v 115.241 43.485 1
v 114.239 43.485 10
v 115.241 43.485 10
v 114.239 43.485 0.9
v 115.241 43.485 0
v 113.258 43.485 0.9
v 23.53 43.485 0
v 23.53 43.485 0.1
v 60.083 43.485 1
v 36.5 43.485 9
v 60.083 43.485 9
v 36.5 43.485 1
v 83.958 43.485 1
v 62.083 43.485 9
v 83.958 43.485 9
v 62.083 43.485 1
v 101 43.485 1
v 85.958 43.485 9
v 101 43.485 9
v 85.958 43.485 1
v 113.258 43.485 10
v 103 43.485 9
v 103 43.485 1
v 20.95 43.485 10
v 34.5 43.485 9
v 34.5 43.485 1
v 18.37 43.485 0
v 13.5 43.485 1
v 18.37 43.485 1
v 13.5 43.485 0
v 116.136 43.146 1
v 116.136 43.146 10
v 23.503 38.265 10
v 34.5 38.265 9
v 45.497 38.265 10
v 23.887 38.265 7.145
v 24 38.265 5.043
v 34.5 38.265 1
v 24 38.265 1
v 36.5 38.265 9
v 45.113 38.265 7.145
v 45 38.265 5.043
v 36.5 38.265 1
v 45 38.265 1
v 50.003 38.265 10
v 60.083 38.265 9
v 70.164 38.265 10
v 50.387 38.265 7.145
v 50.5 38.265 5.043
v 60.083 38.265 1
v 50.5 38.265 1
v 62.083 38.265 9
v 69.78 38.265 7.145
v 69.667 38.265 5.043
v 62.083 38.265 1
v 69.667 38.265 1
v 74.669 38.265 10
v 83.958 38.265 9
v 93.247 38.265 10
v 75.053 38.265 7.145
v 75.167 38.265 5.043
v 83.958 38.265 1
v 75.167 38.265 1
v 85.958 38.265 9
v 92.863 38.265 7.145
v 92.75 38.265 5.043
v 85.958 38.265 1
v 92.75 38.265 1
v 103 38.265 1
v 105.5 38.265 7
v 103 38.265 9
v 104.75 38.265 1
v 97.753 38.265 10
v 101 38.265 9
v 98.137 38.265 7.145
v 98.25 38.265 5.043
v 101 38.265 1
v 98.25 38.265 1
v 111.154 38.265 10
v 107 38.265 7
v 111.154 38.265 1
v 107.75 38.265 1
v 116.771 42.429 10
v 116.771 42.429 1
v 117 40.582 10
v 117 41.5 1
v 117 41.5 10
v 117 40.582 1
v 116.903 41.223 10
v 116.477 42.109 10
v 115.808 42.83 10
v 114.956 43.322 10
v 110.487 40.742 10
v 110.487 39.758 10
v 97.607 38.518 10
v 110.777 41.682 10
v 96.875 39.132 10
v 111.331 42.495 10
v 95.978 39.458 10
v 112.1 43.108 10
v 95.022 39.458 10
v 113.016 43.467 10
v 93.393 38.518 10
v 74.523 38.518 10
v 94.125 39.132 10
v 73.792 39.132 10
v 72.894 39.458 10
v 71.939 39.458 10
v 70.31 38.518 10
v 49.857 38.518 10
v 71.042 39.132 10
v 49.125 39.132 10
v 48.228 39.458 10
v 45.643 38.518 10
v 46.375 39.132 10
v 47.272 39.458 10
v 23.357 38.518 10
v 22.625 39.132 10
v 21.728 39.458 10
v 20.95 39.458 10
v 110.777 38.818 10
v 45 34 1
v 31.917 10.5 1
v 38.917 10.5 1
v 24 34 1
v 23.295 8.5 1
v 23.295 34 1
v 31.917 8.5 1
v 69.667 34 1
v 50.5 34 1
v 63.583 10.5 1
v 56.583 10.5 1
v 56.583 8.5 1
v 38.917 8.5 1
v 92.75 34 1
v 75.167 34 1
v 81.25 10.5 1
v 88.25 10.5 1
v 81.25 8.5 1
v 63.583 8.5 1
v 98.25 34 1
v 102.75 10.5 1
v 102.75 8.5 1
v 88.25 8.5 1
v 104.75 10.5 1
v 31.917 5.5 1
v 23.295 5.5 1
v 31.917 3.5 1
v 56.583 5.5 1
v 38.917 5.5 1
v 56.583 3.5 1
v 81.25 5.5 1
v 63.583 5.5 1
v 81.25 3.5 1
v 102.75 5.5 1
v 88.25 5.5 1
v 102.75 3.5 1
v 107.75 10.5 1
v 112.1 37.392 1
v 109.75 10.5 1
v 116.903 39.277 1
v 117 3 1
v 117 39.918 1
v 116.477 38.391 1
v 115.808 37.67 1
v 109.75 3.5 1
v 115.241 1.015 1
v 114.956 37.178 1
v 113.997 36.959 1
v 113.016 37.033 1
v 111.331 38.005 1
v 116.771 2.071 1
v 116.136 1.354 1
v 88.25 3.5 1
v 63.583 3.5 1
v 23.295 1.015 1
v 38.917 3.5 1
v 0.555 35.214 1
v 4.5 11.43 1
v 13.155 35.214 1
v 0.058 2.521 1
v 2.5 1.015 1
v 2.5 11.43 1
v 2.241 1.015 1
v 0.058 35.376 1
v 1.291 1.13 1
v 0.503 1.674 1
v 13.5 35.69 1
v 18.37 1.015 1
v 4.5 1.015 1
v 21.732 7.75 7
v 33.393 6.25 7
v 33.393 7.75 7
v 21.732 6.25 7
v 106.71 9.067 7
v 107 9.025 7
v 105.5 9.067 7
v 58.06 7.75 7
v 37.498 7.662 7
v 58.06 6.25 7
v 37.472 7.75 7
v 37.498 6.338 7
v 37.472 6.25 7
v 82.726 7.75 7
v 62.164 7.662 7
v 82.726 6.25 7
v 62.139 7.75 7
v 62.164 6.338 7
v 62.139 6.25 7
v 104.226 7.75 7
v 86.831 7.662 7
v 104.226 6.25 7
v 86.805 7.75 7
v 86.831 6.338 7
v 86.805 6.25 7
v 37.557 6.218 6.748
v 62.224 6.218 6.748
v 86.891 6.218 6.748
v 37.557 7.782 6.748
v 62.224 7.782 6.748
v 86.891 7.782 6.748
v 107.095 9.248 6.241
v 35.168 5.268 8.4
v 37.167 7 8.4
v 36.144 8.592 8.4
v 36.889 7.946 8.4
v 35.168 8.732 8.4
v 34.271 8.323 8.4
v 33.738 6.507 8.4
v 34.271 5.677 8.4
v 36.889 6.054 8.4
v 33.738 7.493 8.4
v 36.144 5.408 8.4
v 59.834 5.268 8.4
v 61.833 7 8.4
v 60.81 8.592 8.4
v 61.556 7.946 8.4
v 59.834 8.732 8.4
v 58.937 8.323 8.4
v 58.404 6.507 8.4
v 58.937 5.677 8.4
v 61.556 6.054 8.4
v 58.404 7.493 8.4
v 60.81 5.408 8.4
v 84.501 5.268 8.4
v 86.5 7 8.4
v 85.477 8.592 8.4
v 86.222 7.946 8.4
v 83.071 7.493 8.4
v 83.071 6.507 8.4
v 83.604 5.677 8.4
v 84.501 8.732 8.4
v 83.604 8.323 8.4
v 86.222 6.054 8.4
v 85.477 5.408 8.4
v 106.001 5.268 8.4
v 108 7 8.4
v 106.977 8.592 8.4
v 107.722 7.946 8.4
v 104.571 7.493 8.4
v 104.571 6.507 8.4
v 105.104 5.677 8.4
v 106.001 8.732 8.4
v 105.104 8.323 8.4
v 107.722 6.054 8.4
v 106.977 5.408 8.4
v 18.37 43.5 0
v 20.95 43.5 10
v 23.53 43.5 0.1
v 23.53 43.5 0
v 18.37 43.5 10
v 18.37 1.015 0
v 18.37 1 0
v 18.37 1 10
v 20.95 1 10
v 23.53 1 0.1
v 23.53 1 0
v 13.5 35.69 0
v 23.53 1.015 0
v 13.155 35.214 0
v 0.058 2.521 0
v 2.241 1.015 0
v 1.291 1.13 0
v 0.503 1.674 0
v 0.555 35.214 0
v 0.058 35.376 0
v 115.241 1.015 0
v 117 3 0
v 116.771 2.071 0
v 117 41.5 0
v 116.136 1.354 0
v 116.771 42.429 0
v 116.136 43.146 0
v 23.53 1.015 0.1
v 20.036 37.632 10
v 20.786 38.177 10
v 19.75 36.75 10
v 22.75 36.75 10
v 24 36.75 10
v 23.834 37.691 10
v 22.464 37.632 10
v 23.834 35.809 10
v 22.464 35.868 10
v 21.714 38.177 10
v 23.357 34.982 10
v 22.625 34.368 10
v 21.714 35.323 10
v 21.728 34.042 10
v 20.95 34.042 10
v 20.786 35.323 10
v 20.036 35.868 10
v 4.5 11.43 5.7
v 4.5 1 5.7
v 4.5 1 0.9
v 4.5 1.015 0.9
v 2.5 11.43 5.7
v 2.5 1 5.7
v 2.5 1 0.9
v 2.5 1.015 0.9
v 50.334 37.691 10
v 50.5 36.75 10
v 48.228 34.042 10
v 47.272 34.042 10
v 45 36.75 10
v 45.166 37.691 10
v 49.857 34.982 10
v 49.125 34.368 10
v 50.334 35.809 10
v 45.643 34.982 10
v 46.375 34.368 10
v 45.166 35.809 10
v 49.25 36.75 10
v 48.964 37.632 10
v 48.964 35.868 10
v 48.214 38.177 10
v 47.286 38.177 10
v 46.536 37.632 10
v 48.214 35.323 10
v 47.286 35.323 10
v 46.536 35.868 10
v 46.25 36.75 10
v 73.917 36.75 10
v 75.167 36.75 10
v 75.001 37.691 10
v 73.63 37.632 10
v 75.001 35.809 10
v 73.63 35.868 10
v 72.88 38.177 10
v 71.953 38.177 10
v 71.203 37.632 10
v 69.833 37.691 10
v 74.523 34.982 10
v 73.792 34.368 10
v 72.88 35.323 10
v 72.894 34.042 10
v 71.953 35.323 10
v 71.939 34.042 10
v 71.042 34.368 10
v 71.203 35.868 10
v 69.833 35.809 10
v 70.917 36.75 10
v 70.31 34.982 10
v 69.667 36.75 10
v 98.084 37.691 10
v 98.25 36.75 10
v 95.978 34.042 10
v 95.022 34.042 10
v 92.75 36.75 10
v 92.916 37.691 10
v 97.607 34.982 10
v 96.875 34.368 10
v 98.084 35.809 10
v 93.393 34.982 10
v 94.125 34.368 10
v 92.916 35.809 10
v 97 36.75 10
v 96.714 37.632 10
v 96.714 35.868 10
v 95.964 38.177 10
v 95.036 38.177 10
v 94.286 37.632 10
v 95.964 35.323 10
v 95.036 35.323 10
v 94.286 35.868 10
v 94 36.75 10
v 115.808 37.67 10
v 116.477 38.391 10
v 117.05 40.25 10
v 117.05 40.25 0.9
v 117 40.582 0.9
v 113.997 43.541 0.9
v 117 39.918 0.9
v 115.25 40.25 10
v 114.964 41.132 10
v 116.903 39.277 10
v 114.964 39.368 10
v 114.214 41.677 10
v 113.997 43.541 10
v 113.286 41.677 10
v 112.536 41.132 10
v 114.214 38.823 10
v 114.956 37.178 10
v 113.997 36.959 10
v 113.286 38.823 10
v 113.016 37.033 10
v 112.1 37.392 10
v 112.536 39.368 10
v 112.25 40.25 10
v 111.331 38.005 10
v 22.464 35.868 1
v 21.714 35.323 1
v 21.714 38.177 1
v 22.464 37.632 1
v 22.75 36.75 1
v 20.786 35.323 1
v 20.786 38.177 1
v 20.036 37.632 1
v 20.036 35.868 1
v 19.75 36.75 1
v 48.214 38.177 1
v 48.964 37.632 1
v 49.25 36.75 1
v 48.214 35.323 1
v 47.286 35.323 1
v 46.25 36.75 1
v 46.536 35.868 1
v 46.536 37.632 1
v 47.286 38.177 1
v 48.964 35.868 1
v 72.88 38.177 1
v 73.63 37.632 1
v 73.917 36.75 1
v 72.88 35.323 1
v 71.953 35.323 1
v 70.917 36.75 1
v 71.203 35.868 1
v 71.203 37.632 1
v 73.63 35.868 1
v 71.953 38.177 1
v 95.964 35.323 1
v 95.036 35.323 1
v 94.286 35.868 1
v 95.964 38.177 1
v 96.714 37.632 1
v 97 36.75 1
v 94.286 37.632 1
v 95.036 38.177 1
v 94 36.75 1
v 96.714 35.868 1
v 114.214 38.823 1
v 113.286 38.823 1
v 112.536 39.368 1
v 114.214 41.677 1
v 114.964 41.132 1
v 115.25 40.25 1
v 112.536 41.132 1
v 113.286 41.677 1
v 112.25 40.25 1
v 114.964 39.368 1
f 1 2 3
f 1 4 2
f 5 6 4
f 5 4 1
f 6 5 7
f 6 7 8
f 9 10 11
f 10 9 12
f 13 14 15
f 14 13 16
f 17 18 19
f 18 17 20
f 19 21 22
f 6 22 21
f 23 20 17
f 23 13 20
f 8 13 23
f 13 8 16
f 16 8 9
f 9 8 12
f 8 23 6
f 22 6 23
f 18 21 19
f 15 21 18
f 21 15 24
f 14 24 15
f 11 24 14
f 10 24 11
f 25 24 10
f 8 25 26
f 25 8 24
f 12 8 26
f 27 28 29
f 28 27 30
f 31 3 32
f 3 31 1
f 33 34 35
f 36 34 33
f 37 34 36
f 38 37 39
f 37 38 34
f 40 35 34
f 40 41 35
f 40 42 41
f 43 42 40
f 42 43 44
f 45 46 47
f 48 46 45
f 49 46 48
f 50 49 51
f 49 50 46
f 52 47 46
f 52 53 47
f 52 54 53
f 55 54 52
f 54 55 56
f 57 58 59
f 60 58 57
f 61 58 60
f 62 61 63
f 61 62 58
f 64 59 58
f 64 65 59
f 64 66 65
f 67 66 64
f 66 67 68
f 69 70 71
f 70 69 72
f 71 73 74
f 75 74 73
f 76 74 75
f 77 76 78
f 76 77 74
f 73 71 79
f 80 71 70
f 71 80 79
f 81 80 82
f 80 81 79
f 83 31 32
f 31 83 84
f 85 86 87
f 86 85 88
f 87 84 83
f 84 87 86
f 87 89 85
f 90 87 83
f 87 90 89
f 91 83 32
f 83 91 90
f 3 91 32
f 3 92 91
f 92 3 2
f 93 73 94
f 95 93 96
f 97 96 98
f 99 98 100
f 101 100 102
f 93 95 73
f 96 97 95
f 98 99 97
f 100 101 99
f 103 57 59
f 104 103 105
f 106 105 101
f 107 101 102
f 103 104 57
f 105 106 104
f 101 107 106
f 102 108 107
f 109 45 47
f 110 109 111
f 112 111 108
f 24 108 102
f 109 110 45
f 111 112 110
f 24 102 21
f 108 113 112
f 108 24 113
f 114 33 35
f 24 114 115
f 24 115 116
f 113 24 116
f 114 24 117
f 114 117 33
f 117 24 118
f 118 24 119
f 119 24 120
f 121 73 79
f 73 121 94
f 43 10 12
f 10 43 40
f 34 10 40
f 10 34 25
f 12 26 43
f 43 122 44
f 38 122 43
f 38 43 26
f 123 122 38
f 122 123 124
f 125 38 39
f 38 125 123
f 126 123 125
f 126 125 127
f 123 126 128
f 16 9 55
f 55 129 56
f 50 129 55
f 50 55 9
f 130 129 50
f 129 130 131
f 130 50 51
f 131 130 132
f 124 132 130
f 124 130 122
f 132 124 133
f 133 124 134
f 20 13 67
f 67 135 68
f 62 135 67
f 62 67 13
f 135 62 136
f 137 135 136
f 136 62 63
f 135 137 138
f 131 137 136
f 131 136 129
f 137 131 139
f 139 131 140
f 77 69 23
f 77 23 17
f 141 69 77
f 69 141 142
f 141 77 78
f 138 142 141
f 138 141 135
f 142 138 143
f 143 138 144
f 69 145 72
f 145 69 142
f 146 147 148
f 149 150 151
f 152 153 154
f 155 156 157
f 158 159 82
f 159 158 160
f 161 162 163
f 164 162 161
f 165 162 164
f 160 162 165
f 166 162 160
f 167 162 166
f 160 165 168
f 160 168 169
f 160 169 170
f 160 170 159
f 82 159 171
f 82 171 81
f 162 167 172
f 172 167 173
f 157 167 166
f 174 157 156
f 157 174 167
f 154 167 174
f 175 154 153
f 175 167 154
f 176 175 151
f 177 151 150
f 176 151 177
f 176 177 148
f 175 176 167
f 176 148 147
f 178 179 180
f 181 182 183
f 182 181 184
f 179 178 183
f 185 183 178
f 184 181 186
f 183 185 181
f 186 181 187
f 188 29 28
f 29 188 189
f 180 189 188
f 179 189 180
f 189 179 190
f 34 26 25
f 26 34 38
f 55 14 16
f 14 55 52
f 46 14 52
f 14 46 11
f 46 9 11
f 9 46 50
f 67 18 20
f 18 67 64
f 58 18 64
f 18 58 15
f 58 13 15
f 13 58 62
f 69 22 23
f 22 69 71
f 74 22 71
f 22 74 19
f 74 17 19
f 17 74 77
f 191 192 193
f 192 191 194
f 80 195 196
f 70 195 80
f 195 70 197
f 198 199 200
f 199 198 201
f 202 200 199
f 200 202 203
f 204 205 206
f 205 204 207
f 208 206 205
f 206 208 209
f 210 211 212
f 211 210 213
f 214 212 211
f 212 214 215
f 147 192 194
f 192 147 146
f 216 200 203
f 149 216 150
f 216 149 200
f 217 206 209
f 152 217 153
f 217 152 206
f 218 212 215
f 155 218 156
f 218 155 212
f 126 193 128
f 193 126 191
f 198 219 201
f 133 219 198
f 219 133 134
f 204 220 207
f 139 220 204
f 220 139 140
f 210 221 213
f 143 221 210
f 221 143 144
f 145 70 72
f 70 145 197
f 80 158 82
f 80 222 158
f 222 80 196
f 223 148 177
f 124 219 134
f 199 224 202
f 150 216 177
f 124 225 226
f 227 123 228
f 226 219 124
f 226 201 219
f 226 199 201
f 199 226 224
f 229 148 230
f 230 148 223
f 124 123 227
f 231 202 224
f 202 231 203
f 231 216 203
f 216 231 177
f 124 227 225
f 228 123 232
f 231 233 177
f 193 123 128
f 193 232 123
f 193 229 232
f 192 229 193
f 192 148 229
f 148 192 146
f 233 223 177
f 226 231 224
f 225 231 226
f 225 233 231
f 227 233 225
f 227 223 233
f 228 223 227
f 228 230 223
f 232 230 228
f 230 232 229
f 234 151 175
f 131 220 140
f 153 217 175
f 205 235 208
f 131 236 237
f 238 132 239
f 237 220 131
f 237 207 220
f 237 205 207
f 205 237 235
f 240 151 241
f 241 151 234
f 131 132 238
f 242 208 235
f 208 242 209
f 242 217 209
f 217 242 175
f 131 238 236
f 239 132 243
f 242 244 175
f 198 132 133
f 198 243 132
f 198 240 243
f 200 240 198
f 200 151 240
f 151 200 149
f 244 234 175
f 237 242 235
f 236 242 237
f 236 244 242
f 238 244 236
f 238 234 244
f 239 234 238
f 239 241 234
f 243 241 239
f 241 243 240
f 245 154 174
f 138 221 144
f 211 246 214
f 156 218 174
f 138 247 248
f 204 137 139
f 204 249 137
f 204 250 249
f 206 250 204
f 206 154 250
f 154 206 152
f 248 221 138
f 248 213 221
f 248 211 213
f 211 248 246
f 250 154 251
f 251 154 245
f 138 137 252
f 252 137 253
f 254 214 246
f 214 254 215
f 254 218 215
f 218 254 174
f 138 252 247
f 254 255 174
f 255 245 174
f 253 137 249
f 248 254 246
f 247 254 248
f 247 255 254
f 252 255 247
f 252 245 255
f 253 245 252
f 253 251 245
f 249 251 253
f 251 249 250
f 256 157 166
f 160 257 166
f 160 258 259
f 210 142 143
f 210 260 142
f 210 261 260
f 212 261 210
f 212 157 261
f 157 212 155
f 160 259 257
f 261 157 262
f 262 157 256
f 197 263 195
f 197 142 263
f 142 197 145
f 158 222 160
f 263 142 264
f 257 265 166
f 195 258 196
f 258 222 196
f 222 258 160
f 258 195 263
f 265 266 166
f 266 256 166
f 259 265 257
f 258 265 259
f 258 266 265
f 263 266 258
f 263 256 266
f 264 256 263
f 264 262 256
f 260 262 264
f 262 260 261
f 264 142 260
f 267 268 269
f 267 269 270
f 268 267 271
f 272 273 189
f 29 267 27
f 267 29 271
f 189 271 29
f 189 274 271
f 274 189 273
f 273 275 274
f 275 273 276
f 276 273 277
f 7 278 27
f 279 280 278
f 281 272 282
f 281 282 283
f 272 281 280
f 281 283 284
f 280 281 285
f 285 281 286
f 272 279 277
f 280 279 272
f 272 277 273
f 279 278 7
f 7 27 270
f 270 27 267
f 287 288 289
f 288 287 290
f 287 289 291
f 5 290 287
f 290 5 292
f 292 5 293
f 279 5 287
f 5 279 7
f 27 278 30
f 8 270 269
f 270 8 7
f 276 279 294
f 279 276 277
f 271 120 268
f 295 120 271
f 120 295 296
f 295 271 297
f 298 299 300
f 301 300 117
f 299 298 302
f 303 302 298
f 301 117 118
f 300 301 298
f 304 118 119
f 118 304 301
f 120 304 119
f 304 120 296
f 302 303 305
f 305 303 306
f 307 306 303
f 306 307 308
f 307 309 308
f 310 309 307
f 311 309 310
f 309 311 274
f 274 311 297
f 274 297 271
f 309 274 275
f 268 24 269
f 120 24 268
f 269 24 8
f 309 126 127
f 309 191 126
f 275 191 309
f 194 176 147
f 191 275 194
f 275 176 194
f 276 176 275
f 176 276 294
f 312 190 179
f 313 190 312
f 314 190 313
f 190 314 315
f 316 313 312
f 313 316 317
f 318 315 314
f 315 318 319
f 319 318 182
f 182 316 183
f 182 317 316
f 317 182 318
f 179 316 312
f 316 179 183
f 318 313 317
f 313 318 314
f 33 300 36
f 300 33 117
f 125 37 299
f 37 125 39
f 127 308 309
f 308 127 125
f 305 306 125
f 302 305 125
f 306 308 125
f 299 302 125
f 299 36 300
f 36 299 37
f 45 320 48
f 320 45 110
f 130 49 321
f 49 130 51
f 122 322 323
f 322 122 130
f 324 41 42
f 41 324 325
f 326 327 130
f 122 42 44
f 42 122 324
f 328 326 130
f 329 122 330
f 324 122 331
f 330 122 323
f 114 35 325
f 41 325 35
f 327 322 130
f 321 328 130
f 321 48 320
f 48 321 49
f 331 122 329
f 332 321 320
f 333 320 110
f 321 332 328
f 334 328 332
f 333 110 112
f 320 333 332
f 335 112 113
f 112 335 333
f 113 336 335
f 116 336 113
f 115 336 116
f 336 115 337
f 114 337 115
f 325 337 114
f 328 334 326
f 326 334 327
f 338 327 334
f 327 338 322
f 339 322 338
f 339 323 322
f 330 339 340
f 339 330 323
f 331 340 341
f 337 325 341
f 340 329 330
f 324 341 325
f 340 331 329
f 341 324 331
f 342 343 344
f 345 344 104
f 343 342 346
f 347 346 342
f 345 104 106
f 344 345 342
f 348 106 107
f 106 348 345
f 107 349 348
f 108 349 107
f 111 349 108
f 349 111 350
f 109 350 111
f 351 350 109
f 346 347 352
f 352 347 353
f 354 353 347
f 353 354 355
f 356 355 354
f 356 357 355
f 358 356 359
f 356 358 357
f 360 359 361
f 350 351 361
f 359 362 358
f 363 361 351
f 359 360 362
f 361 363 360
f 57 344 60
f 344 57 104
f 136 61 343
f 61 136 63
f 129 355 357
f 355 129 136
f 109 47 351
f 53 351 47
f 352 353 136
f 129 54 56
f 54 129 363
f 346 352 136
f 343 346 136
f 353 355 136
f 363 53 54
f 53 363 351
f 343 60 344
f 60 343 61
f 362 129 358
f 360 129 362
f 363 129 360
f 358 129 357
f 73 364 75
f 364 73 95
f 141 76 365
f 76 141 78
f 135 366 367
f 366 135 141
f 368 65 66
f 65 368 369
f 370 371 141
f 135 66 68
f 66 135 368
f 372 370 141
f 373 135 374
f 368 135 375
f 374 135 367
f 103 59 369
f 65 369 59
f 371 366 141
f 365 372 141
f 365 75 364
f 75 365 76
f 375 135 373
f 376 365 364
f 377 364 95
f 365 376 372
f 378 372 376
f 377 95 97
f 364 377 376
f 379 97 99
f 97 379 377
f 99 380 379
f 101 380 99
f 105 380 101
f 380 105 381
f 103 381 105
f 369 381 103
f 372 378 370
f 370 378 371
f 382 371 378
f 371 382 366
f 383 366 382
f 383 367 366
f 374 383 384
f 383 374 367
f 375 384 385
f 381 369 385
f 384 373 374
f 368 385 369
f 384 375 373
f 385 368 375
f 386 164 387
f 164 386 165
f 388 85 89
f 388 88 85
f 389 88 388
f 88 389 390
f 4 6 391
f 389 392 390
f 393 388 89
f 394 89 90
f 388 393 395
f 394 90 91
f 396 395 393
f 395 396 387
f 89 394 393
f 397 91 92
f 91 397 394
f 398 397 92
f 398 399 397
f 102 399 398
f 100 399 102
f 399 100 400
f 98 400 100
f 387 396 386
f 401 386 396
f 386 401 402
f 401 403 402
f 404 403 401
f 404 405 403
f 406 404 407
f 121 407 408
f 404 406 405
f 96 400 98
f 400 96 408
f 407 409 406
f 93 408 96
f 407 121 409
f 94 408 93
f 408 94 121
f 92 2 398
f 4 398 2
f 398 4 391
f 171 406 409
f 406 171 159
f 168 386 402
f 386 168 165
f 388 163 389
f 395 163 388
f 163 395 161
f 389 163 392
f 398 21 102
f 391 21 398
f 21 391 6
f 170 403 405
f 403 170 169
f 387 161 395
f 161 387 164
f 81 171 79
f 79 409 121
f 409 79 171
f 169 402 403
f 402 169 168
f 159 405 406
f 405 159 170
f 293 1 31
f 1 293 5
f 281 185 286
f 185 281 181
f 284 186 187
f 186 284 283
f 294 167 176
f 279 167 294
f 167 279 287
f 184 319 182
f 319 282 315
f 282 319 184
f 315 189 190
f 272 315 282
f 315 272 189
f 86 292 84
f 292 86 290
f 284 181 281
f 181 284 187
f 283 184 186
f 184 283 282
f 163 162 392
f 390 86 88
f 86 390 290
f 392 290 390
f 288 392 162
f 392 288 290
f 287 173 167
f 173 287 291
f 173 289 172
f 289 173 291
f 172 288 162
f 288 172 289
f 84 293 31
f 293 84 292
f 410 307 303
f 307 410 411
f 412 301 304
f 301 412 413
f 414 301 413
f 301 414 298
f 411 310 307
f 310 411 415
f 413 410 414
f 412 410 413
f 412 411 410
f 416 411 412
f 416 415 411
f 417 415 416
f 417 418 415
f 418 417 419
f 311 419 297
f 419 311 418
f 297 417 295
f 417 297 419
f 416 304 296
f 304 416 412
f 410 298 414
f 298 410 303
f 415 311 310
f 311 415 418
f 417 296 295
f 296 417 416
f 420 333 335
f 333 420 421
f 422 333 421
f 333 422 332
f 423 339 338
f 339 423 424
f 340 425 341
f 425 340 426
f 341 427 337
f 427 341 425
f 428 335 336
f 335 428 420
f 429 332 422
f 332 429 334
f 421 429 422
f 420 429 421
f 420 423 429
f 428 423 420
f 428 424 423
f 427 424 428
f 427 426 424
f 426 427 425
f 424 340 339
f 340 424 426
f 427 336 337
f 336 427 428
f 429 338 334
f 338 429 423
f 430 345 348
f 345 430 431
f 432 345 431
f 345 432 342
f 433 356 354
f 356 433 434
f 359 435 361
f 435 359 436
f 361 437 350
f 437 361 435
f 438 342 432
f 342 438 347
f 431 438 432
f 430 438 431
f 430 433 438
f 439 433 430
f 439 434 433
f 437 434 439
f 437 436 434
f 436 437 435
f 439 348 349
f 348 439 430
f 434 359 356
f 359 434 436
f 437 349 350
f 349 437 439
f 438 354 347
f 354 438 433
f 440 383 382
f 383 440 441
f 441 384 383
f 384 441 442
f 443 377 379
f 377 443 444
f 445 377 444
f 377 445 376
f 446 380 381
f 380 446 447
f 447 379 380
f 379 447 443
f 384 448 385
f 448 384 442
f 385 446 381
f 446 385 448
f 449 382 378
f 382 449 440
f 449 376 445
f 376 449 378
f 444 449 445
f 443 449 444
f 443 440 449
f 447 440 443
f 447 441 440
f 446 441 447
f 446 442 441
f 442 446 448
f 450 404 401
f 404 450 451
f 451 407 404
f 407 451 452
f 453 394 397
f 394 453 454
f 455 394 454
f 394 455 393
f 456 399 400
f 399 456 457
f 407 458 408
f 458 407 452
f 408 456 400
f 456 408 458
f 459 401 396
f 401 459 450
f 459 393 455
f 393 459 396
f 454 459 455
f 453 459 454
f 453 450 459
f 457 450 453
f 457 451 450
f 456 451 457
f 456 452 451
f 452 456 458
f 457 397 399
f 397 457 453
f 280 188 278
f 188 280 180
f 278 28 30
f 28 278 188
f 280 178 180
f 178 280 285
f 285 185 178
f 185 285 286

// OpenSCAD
hq = true;
clr = 0.2;

$fs = hq ? 1 : 4;
$fa = hq ? 1 : 4;
eps = 0.1;

// Constants from the Eagle file

// Board dimensions
board_x = 0;
board_y = 0;
board_w = 117;
board_h = 43.5;
board_r = 2;
board_ne_r = 3.3;
board_min_y = 1;                // screwup: make board 1mm shorter.

// Teensy location
teensy_cx =  9.08;
teensy_cy = 19.05;
teensy_w =  7 * 2.54;
teensy_h = 14 * 2.54;
teensy_paddle_w = 20.75;

// Tactile switches
sw1_x = 35.416665625;
sw1_y = 7;
sw2_x = 60.083334375;
sw2_y = 7;
sw3_x = 84.75;
sw3_y = 7;
sw4_x = 106.25;
sw4_y = 7;
swlast_x = sw4_x;
sw_d = 2.5;

// Screw holes
hole1_x = 21.25;
hole1_y = 36.75;

hole2_x = 47.75;
hole2_y = 36.75;

hole3_x = 72.416665625;
hole3_y = 36.75;

hole4_x = 95.5;
hole4_y = 36.75;

hole5_x = 113.75;
hole5_y = 40.25;

hole_d = 3;
hole_clr = 0;

// Paddles
paddle_y = 3.5;

// Spine
spine_y = 38.25;
spine_cx2 = (37.25 + 48.5) / 2;
spine_cx3 = (58.75 + 66.72) / 2;

// Header
header_cx = 7.79;
header_cy = 39.73;
header_w = 3 * 2.54;
header_h = 2 * 2.54;

// End Eagle constants

teensy_rx = teensy_cx + teensy_w / 2 + clr; // Teensy right side x coord.

// Z heights
base_z = 1;
deck_z = base_z + 9;
sw_z = deck_z - 1.6;
teensy_z = deck_z - 4.1;
bulkhead_z = deck_z - 3;

module centered_cube(size, zt=0) {
    translate([-size[0] / 2, -size[1] / 2, zt])
        cube(size);
}

module round_rect(size, r) {
    hull()
        for (x = [r, size[0] - r]) for ( y = [r, size[1] - r]) {
            translate([x, y, 0])
                cylinder(r=r, h=size[2]);
        }
}


module base() {
    translate([0, board_min_y, 0])
        round_rect([board_w, board_h - board_min_y, base_z], board_r);
}

module spine() {
    lx = teensy_rx + clr;
    difference() {
        translate([lx, spine_y, base_z - eps])
            round_rect([board_w - lx, board_h - spine_y, deck_z - base_z + eps],
                       r=board_r);
        // strain relief
        translate([(hole1_x + hole2_x) / 2, spine_y - eps, base_z])
            cube([2, board_h, deck_z - base_z - 1]);
        translate([(hole2_x + hole3_x) / 2, spine_y - eps, base_z])
            cube([2, board_h, deck_z - base_z - 1]);
        translate([(hole3_x + hole4_x) / 2, spine_y - eps, base_z])
            cube([2, board_h, deck_z - base_z - 1]);
        translate([board_w - 16, spine_y - eps, base_z])
            cube([2, board_h, deck_z - base_z - 1]);
    }
}

module bulkheads() {
    bt0 = 3;
    bt1 = 1.5;
    bx = teensy_rx + clr;
    by = sw1_y;
    bw = swlast_x - bx;
    bh = board_h - by;
    translate([bx + eps, by, 0])
        hull() {
            translate([0, -bt0/2, base_z - eps])
                cube([bw + bt0/2, bt0, eps]);
            translate([0, -bt1/2, bulkhead_z - eps])
                cube([bw + bt1/2, bt1, eps]);
        }
    translate([bx + bw, board_h, 0])
        rotate(-90)
            hull() {
                translate([eps, -bt0/2, base_z - eps])
                    cube([bh + bt0/2 - eps, bt0, eps]);
                translate([eps, -bt1/2, bulkhead_z - eps])
                    cube([bh + bt1/2 - eps, bt1, eps]);
            }
}

module screw_support(x, y, z) {
    support_d = hole_d + 2.5;
    hull() {
        translate([x, y, base_z - eps])
            centered_cube([support_d, support_d, eps]);
        translate([x, y, z - eps])
            cylinder(d=support_d, h = eps);
    }
}

module end_screw_support(x, y ,z) {
    support_r = board_ne_r;
    translate([x, y, base_z - eps])
        cylinder(r = support_r, h = z - base_z + eps);
}

module screw_supports() {
    screw_support(hole1_x, hole1_y, deck_z);
    screw_support(hole2_x, hole2_y, deck_z);
    screw_support(hole3_x, hole3_y, deck_z);
    screw_support(hole4_x, hole4_y, deck_z);
    end_screw_support(hole5_x, hole5_y, deck_z);
}

module screw_hole(x, y, z) {
    translate([x, y, z])
        cylinder(d=hole_d + hole_clr, h=deck_z + 3);
}

module screw_holes() {
    screw_hole(hole1_x, hole1_y, base_z);
    screw_hole(hole2_x, hole2_y, base_z);
    screw_hole(hole3_x, hole3_y, base_z);
    screw_hole(hole4_x, hole4_y, base_z);
    screw_hole(hole5_x, hole5_y, base_z);
}

module switch_pillars() {
    module switch_pillar(x, y) {
        mbh = 2 * (y - paddle_y);
        mbw = mbh;
        translate([x, y, 0])
            hull() {
                centered_cube([mbw, mbh, eps], zt=base_z - eps);
                translate([0, 0, sw_z - eps])
                    cylinder(d=sw_d + 1, h=eps);
            }
    }
    switch_pillar(sw1_x, sw1_y);
    switch_pillar(sw2_x, sw2_y);
    switch_pillar(sw3_x, sw3_y);
    switch_pillar(sw4_x, sw4_y);
}

module under_teensy() {
    uw = teensy_paddle_w - teensy_rx;
    translate([teensy_rx + clr, board_min_y, 0])
        hull() {
            cube([2 * uw, board_h - board_min_y, eps]);
            translate([0, 0, deck_z - eps])
                cube([uw, board_h - board_min_y, eps]);
        }
    translate([2.5, board_min_y, base_z - eps])
        cube([2, 4.5 * 2.54 - board_min_y, teensy_z - base_z - eps]);
}

module header_cutout() {
    hdr_clr = 2;
    translate([-eps, header_cy - header_h / 2 - hdr_clr, -eps])
        round_rect([header_cx + header_w / 2 + hdr_clr,
                    board_h,
                    deck_z + 2 * eps],
                   r=0.5);
}

module substrate() {
    difference() {
        union() {
            base();
            spine();
            bulkheads();
            switch_pillars();
            under_teensy();
            screw_supports();
        };
        screw_holes();
        header_cutout();
    };
}

substrate();
